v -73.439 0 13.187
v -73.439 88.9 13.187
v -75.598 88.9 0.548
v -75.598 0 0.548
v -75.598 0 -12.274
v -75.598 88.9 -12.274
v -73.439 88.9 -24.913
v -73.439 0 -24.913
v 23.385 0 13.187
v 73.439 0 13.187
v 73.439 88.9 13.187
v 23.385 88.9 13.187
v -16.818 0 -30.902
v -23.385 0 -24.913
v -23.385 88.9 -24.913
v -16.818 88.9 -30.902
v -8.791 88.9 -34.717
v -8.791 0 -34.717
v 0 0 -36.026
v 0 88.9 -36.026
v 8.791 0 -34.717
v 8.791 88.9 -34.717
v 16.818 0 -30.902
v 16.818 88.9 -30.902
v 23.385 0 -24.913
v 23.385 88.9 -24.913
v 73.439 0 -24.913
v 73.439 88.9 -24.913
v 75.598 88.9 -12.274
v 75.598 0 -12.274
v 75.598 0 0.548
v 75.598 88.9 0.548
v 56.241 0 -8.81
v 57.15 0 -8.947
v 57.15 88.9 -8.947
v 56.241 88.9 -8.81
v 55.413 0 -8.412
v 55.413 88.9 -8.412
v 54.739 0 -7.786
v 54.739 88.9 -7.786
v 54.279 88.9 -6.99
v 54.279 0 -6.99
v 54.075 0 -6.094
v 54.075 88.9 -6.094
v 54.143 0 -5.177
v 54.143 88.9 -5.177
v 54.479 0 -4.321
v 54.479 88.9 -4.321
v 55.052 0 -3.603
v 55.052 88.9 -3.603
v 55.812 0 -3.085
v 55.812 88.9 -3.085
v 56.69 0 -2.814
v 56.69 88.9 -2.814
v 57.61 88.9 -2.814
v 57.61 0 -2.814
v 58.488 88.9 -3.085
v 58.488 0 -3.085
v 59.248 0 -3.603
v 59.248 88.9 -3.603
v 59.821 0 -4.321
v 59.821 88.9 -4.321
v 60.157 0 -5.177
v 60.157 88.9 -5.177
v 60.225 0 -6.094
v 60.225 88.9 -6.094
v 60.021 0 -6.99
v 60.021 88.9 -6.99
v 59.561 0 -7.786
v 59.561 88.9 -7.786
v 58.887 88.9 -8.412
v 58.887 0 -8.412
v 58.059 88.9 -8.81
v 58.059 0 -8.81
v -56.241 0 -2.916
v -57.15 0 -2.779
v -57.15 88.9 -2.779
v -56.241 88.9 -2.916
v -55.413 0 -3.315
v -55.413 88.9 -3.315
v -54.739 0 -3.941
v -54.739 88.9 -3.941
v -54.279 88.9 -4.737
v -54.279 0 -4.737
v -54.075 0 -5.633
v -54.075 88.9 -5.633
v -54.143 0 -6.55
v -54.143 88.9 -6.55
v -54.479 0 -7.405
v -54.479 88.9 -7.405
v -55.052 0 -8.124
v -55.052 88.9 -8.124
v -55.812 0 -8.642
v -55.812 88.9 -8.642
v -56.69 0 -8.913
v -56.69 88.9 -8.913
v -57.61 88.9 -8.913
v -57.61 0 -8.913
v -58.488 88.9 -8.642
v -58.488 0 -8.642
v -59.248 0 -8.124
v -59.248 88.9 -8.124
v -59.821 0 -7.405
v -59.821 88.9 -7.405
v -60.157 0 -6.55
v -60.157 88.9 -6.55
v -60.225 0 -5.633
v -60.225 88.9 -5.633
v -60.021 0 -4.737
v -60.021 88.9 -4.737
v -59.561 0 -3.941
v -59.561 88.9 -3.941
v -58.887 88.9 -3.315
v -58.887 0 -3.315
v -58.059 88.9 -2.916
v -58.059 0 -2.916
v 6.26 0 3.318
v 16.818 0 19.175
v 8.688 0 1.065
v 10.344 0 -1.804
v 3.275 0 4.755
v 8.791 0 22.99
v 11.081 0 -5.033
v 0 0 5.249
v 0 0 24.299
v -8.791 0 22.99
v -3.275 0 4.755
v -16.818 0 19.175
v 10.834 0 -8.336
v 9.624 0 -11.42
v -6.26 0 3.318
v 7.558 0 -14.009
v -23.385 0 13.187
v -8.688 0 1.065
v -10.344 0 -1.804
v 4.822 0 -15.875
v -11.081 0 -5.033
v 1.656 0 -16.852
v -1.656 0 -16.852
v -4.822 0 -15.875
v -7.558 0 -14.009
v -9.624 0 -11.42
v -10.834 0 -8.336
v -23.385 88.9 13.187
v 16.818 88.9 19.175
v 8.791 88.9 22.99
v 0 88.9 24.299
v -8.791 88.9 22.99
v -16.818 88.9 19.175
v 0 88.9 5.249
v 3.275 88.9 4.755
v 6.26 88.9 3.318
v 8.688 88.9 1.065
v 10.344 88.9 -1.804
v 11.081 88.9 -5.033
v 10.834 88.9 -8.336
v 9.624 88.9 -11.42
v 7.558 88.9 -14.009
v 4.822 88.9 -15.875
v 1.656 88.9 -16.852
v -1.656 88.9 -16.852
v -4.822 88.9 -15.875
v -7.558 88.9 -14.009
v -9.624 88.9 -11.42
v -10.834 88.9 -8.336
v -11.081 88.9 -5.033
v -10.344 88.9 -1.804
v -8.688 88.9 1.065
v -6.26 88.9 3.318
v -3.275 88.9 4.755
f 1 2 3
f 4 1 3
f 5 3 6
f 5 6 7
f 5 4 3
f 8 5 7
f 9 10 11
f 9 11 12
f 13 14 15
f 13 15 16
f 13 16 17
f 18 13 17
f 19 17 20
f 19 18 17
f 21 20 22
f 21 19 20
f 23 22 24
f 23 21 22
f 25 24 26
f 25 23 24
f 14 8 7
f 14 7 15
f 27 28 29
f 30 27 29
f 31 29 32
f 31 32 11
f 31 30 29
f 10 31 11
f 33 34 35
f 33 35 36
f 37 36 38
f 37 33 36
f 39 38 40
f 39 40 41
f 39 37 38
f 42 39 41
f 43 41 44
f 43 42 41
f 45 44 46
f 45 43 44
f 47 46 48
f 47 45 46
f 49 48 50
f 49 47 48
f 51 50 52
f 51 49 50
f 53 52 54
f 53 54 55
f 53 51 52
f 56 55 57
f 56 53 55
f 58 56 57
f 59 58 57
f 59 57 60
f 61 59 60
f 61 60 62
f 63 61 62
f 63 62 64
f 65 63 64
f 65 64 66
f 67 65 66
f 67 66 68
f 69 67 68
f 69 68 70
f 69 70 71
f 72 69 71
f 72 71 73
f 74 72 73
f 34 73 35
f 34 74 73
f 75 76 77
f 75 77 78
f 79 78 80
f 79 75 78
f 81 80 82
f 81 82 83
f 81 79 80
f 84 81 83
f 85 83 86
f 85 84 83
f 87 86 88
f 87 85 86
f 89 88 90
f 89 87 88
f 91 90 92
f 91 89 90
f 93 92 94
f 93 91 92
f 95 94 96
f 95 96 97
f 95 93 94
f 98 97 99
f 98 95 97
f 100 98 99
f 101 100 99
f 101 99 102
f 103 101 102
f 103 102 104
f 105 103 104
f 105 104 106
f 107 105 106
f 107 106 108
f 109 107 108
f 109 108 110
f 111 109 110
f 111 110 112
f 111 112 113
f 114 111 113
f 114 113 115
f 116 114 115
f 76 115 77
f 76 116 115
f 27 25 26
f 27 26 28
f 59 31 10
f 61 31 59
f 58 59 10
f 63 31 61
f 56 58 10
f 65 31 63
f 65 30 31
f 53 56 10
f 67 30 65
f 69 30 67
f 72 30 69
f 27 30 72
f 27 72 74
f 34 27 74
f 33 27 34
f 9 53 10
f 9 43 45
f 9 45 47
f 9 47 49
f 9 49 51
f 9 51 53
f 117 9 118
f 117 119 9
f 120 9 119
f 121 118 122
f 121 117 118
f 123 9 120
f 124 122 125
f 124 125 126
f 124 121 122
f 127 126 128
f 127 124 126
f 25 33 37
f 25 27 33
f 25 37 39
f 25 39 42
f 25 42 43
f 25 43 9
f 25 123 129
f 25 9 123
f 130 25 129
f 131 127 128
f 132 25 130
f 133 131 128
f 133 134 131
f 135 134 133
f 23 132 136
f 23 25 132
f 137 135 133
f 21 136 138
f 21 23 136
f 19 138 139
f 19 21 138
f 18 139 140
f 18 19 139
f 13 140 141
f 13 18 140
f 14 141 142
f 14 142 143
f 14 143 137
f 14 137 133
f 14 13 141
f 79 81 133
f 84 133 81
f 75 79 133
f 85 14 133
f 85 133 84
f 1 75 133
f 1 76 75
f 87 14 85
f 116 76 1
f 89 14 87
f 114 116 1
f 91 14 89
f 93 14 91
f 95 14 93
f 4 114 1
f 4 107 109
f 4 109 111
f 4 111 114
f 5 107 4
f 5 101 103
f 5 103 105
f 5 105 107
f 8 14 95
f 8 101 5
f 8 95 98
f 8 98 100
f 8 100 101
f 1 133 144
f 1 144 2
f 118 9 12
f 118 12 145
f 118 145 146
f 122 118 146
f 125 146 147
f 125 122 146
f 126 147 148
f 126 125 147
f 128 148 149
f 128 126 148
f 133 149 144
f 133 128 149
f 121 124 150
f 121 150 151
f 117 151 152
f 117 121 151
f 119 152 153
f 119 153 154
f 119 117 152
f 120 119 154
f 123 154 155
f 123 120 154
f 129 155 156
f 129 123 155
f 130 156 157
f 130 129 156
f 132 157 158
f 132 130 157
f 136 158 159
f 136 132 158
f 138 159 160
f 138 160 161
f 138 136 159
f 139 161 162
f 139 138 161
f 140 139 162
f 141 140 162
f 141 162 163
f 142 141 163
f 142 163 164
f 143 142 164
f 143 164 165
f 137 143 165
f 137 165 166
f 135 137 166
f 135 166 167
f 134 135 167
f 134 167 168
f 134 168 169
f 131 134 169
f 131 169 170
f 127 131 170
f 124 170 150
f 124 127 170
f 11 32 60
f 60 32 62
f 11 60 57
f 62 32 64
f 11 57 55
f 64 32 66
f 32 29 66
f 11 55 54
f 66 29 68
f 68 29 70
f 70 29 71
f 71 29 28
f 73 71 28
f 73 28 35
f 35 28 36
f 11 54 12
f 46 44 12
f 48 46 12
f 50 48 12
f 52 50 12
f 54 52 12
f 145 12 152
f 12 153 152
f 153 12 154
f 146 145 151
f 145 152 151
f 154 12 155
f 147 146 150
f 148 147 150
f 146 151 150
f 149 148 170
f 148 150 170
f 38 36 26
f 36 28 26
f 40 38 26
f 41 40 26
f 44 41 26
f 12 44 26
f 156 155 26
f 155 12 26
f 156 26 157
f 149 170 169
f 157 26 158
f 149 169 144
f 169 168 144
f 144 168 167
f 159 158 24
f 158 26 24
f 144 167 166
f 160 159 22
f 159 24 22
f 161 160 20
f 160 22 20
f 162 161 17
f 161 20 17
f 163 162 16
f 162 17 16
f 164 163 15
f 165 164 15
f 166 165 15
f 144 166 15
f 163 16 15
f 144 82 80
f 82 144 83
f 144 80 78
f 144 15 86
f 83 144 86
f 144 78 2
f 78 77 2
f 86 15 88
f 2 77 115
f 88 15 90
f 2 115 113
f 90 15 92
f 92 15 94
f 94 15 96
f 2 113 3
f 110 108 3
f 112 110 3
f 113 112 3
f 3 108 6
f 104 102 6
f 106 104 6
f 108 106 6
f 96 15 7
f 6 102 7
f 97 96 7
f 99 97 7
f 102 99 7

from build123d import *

# Parameters (mm, degrees)
SKETCH_1_R      = 11.1125
SKETCH_1_R_2    = 3.084022448
EXTRUDE_1_DEPTH = 88.9


with BuildPart() as part:
    # Эскиз1 → Бобышка-Вытянуть1 (new body)
    with BuildSketch(Plane(origin=(0, 0, 0), x_dir=(1, 0, 0), z_dir=(0, 1, 0))):
        with BuildLine():
            Line((73.439254163, -13.186564551), (23.385335282, -13.186564551))
            ThreePointArc((23.385335282, -13.186564551), (0, -24.299064551), (-23.385335282, -13.186564551))
            Line((-23.385335282, -13.186564551), (-73.439254163, -13.186564551))
            ThreePointArc((-73.439254163, -13.186564551), (-75.8698, 5.863435449), (-73.439254163, 24.913435449))
            Line((-73.439254163, 24.913435449), (-23.385335282, 24.913435449))
            ThreePointArc((-23.385335282, 24.913435449), (0, 36.025935449), (23.385335282, 24.913435449))
            Line((23.385335282, 24.913435449), (73.439254163, 24.913435449))
            ThreePointArc((73.439254163, 24.913435449), (75.8698, 5.863435449), (73.439254163, -13.186564551))
        make_face()
        with Locations(Location((0, 5.863435449, 0), (0, 0, 270))):
            Circle(SKETCH_1_R, mode=Mode.SUBTRACT)
        with Locations(Location((-57.15, 5.863435449, 0), (0, 0, 270))):
            Circle(SKETCH_1_R_2, mode=Mode.SUBTRACT)
        with Locations(Location((57.15, 5.863435449, 0), (0, 0, 90))):
            Circle(SKETCH_1_R_2, mode=Mode.SUBTRACT)
    extrude(amount=EXTRUDE_1_DEPTH)


solid = part.part
